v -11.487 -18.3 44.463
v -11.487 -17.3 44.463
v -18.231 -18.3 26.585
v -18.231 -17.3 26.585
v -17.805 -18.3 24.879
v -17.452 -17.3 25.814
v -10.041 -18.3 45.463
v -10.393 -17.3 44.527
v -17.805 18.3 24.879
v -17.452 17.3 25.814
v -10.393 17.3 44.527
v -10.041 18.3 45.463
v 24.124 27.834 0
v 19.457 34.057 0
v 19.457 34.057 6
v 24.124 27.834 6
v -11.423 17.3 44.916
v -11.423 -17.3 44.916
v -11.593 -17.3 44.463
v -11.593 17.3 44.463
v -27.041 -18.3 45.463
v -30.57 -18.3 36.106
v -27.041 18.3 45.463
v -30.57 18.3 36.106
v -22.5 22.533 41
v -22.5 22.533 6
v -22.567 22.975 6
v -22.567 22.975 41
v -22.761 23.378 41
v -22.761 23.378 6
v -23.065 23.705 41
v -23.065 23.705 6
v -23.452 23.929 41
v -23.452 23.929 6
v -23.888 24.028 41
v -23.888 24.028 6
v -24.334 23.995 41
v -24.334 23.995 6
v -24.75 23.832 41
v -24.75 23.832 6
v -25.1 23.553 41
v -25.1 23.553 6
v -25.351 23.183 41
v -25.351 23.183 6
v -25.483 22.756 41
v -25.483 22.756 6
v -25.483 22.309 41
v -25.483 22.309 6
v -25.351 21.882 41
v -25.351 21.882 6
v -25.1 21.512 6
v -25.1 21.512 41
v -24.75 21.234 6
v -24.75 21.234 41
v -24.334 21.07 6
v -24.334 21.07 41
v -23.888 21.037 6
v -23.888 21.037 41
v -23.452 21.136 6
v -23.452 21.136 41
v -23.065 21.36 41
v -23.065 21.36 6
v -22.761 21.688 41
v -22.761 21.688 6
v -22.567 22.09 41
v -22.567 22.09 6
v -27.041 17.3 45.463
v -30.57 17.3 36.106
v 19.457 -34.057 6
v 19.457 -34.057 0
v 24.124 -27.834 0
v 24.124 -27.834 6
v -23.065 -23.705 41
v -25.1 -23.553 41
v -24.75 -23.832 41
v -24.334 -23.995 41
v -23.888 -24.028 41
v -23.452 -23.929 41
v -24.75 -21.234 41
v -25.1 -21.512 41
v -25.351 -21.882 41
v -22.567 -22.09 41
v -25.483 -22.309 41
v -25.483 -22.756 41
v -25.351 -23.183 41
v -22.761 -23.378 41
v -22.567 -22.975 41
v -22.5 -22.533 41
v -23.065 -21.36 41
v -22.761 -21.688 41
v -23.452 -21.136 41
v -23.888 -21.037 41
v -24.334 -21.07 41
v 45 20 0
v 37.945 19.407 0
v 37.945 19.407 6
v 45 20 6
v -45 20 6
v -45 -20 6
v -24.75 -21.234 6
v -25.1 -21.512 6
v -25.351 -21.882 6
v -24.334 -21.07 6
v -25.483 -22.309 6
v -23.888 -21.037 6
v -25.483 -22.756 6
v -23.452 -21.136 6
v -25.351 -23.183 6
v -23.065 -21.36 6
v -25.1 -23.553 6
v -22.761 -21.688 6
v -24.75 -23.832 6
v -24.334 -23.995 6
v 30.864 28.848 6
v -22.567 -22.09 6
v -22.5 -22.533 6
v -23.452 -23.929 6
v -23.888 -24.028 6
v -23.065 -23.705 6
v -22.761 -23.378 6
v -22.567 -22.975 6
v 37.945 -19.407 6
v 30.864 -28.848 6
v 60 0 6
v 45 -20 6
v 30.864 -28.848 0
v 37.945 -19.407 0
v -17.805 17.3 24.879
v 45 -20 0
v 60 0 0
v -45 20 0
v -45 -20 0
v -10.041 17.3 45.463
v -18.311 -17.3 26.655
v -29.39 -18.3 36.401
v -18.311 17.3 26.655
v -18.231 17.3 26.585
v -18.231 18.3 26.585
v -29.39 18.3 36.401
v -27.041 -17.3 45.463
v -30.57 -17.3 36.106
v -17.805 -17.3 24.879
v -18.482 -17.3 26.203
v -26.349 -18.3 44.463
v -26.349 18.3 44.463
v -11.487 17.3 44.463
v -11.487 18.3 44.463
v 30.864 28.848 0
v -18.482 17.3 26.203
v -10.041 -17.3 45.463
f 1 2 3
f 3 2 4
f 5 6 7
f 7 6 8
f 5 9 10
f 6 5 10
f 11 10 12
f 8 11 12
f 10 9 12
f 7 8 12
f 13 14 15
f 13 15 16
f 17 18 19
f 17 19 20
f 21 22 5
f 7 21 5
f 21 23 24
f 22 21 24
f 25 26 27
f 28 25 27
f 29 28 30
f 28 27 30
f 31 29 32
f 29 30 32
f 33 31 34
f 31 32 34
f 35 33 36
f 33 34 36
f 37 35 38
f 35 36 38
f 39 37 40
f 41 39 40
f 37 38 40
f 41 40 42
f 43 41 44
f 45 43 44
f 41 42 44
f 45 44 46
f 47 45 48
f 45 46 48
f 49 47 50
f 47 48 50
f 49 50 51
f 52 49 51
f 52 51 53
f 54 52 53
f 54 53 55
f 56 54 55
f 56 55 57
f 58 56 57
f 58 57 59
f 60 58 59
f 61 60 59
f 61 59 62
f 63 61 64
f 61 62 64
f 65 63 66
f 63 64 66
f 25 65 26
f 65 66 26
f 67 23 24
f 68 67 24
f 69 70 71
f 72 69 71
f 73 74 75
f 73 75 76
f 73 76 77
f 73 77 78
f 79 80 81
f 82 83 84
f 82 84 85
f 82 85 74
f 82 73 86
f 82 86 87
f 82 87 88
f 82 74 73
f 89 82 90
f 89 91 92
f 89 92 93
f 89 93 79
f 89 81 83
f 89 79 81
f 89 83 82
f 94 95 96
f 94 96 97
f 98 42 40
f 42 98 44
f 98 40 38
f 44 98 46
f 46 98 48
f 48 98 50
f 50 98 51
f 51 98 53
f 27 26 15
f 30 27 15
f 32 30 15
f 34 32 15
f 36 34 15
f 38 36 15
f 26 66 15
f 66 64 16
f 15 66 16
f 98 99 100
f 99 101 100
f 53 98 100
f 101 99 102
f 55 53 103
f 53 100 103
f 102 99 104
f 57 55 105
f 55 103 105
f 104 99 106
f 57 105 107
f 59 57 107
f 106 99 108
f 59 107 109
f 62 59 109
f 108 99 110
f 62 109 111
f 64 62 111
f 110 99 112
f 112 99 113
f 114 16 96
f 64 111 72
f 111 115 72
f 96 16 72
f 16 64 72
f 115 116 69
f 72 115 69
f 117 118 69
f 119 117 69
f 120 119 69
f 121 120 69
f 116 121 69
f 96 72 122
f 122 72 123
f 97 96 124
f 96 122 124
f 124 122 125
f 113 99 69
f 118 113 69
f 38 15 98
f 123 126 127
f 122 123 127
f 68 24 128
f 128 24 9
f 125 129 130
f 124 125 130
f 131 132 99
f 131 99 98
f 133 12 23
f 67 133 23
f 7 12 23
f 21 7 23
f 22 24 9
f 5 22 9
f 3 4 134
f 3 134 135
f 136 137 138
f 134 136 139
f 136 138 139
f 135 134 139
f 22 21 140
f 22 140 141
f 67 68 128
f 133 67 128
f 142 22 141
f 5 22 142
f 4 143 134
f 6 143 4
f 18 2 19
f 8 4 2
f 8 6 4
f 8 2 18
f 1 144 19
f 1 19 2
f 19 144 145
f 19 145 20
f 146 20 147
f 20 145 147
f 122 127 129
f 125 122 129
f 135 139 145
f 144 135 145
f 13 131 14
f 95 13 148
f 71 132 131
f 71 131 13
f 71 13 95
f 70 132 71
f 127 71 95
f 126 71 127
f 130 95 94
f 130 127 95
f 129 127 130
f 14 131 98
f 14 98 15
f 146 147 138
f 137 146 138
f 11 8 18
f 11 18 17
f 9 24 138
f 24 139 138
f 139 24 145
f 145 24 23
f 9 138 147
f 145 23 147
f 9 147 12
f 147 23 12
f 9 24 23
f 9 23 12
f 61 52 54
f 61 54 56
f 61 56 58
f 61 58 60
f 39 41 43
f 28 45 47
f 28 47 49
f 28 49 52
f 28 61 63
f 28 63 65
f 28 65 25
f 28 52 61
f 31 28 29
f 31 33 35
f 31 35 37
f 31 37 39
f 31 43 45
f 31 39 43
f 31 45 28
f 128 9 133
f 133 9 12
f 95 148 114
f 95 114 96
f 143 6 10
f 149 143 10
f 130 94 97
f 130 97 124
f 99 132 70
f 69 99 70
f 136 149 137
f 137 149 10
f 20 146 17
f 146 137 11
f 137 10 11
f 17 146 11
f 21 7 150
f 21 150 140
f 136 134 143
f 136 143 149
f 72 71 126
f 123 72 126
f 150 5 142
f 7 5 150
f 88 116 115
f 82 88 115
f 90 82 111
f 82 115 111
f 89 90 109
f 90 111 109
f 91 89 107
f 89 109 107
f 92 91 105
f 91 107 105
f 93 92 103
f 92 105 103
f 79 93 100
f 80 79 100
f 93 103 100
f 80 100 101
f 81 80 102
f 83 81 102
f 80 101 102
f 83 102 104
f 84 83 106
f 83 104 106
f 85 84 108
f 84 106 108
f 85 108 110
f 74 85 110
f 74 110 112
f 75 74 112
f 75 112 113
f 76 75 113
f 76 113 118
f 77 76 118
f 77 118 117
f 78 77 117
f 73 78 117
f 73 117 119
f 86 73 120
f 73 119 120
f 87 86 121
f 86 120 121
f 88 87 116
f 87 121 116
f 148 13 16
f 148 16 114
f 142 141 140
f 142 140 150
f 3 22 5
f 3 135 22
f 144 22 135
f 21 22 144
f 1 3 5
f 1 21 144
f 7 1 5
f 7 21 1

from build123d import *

# Parameters (mm, degrees)
F1_DEPTH  = 6
F4_R      = 1.5
F5_DEPTH  = 35
F12_DEPTH = 1
F14_DEPTH = 36.6
F15_W     = 34.6
F15_H     = 20
F16_DEPTH = 1.1
F17_DEPTH = 39.7
F18_DEPTH = 40.4


# Not quite as in the source:
# - a feature of the source that left no trace in its solid (it failed there, or was rolled back) is left out
# - the program builds the solid bodies; features that only make, move or delete a surface that nothing else refers to are left out


with BuildPart() as f1:
    # F0 (on Top) → F1 (new body)
    with BuildSketch(Plane.XY):
        Polygon((37.9445583731, -19.4072555025), (45, -20), (60, 0), (-45, 0), (-45, -12.4388851051), align=None)
        Polygon((30.8642615863, -28.8476512183), (37.9445583731, -19.4072555025), (-45, -12.4388851051), (-45, -17.4388851051), (24.1244330356, -27.8340892858), align=None)
        Polygon((24.1244330356, -27.8340892858), (-45, -17.4388851051), (-45, -20), (19.4574833105, -34.0566889193), align=None)
    extrude(amount=F1_DEPTH)

    # F2: F1 across plane


with BuildPart() as f1_1:
    add(f1.part)
    add(f1.part.mirror(Plane.XZ))

    # F4 (on face) → F5 (join)
    with BuildSketch(Plane.XY.offset(6)):
        with Locations((-24, -22.5326099851)):
            Circle(F4_R)
        with Locations((-24, 22.5326099851)):
            Circle(F4_R)
    extrude(amount=F5_DEPTH)

    # F17 (add): a face of the model
    f17_faces = [f1_1.faces().sort_by_distance(p)[0] for p in [
        (-24, -22.5326099851, 41),
    ]]
    extrude(f17_faces, amount=-F17_DEPTH)

    # F18 (add): a face of the model
    f18_faces = [f1_1.faces().sort_by_distance(p)[0] for p in [
        (-24, 22.5326099851, 41),
    ]]
    extrude(f18_faces, amount=-F18_DEPTH)


with BuildPart() as f12:
    # F11 (on offset) → F12 (new body)
    with BuildSketch(Plane.XZ.offset(-18.3)):
        Polygon((-10.0405558896, 45.4629359559), (-27.0405558896, 45.4629359559), (-30.5699676544, 36.1064808262), (-17.805261772, 24.8787346705), align=None)
        Polygon((-29.3902407032, 36.4005984732), (-26.3489918148, 44.4629359559), (-11.4865535006, 44.4629359559), (-18.230555187, 26.5846170234), align=None, mode=Mode.SUBTRACT)
        Polygon((-11.4865535006, 44.4629359559), (-26.3489918148, 44.4629359559), (-29.3902407032, 36.4005984732), (-18.230555187, 26.5846170234), align=None)
    extrude(amount=F12_DEPTH)


with BuildPart() as f13_1:
    # F13: instance of F12
    add(f12.part.mirror(Plane.XZ))


with BuildPart() as f14:
    # F11 (on offset) → F14 (new body, through all)
    with BuildSketch(Plane.XZ.offset(-18.3)):
        Polygon((-10.0405558896, 45.4629359559), (-27.0405558896, 45.4629359559), (-30.5699676544, 36.1064808262), (-17.805261772, 24.8787346705), align=None)
        Polygon((-29.3902407032, 36.4005984732), (-26.3489918148, 44.4629359559), (-11.4865535006, 44.4629359559), (-18.230555187, 26.5846170234), align=None, mode=Mode.SUBTRACT)
    extrude(amount=F14_DEPTH)

    # F15 (on face) → F16 (cut)
    with BuildSketch(Plane(origin=(-23.8029558046, 0, 8.9788740593), x_dir=(0, 1, 0), z_dir=(0.935645513, 0, -0.3529411765))):
        with Locations((0, 27.9934664258)):
            Rectangle(F15_W, F15_H)
    extrude(amount=-F16_DEPTH, mode=Mode.SUBTRACT)


solid = Compound([f1_1.part, f12.part, f13_1.part, f14.part])
